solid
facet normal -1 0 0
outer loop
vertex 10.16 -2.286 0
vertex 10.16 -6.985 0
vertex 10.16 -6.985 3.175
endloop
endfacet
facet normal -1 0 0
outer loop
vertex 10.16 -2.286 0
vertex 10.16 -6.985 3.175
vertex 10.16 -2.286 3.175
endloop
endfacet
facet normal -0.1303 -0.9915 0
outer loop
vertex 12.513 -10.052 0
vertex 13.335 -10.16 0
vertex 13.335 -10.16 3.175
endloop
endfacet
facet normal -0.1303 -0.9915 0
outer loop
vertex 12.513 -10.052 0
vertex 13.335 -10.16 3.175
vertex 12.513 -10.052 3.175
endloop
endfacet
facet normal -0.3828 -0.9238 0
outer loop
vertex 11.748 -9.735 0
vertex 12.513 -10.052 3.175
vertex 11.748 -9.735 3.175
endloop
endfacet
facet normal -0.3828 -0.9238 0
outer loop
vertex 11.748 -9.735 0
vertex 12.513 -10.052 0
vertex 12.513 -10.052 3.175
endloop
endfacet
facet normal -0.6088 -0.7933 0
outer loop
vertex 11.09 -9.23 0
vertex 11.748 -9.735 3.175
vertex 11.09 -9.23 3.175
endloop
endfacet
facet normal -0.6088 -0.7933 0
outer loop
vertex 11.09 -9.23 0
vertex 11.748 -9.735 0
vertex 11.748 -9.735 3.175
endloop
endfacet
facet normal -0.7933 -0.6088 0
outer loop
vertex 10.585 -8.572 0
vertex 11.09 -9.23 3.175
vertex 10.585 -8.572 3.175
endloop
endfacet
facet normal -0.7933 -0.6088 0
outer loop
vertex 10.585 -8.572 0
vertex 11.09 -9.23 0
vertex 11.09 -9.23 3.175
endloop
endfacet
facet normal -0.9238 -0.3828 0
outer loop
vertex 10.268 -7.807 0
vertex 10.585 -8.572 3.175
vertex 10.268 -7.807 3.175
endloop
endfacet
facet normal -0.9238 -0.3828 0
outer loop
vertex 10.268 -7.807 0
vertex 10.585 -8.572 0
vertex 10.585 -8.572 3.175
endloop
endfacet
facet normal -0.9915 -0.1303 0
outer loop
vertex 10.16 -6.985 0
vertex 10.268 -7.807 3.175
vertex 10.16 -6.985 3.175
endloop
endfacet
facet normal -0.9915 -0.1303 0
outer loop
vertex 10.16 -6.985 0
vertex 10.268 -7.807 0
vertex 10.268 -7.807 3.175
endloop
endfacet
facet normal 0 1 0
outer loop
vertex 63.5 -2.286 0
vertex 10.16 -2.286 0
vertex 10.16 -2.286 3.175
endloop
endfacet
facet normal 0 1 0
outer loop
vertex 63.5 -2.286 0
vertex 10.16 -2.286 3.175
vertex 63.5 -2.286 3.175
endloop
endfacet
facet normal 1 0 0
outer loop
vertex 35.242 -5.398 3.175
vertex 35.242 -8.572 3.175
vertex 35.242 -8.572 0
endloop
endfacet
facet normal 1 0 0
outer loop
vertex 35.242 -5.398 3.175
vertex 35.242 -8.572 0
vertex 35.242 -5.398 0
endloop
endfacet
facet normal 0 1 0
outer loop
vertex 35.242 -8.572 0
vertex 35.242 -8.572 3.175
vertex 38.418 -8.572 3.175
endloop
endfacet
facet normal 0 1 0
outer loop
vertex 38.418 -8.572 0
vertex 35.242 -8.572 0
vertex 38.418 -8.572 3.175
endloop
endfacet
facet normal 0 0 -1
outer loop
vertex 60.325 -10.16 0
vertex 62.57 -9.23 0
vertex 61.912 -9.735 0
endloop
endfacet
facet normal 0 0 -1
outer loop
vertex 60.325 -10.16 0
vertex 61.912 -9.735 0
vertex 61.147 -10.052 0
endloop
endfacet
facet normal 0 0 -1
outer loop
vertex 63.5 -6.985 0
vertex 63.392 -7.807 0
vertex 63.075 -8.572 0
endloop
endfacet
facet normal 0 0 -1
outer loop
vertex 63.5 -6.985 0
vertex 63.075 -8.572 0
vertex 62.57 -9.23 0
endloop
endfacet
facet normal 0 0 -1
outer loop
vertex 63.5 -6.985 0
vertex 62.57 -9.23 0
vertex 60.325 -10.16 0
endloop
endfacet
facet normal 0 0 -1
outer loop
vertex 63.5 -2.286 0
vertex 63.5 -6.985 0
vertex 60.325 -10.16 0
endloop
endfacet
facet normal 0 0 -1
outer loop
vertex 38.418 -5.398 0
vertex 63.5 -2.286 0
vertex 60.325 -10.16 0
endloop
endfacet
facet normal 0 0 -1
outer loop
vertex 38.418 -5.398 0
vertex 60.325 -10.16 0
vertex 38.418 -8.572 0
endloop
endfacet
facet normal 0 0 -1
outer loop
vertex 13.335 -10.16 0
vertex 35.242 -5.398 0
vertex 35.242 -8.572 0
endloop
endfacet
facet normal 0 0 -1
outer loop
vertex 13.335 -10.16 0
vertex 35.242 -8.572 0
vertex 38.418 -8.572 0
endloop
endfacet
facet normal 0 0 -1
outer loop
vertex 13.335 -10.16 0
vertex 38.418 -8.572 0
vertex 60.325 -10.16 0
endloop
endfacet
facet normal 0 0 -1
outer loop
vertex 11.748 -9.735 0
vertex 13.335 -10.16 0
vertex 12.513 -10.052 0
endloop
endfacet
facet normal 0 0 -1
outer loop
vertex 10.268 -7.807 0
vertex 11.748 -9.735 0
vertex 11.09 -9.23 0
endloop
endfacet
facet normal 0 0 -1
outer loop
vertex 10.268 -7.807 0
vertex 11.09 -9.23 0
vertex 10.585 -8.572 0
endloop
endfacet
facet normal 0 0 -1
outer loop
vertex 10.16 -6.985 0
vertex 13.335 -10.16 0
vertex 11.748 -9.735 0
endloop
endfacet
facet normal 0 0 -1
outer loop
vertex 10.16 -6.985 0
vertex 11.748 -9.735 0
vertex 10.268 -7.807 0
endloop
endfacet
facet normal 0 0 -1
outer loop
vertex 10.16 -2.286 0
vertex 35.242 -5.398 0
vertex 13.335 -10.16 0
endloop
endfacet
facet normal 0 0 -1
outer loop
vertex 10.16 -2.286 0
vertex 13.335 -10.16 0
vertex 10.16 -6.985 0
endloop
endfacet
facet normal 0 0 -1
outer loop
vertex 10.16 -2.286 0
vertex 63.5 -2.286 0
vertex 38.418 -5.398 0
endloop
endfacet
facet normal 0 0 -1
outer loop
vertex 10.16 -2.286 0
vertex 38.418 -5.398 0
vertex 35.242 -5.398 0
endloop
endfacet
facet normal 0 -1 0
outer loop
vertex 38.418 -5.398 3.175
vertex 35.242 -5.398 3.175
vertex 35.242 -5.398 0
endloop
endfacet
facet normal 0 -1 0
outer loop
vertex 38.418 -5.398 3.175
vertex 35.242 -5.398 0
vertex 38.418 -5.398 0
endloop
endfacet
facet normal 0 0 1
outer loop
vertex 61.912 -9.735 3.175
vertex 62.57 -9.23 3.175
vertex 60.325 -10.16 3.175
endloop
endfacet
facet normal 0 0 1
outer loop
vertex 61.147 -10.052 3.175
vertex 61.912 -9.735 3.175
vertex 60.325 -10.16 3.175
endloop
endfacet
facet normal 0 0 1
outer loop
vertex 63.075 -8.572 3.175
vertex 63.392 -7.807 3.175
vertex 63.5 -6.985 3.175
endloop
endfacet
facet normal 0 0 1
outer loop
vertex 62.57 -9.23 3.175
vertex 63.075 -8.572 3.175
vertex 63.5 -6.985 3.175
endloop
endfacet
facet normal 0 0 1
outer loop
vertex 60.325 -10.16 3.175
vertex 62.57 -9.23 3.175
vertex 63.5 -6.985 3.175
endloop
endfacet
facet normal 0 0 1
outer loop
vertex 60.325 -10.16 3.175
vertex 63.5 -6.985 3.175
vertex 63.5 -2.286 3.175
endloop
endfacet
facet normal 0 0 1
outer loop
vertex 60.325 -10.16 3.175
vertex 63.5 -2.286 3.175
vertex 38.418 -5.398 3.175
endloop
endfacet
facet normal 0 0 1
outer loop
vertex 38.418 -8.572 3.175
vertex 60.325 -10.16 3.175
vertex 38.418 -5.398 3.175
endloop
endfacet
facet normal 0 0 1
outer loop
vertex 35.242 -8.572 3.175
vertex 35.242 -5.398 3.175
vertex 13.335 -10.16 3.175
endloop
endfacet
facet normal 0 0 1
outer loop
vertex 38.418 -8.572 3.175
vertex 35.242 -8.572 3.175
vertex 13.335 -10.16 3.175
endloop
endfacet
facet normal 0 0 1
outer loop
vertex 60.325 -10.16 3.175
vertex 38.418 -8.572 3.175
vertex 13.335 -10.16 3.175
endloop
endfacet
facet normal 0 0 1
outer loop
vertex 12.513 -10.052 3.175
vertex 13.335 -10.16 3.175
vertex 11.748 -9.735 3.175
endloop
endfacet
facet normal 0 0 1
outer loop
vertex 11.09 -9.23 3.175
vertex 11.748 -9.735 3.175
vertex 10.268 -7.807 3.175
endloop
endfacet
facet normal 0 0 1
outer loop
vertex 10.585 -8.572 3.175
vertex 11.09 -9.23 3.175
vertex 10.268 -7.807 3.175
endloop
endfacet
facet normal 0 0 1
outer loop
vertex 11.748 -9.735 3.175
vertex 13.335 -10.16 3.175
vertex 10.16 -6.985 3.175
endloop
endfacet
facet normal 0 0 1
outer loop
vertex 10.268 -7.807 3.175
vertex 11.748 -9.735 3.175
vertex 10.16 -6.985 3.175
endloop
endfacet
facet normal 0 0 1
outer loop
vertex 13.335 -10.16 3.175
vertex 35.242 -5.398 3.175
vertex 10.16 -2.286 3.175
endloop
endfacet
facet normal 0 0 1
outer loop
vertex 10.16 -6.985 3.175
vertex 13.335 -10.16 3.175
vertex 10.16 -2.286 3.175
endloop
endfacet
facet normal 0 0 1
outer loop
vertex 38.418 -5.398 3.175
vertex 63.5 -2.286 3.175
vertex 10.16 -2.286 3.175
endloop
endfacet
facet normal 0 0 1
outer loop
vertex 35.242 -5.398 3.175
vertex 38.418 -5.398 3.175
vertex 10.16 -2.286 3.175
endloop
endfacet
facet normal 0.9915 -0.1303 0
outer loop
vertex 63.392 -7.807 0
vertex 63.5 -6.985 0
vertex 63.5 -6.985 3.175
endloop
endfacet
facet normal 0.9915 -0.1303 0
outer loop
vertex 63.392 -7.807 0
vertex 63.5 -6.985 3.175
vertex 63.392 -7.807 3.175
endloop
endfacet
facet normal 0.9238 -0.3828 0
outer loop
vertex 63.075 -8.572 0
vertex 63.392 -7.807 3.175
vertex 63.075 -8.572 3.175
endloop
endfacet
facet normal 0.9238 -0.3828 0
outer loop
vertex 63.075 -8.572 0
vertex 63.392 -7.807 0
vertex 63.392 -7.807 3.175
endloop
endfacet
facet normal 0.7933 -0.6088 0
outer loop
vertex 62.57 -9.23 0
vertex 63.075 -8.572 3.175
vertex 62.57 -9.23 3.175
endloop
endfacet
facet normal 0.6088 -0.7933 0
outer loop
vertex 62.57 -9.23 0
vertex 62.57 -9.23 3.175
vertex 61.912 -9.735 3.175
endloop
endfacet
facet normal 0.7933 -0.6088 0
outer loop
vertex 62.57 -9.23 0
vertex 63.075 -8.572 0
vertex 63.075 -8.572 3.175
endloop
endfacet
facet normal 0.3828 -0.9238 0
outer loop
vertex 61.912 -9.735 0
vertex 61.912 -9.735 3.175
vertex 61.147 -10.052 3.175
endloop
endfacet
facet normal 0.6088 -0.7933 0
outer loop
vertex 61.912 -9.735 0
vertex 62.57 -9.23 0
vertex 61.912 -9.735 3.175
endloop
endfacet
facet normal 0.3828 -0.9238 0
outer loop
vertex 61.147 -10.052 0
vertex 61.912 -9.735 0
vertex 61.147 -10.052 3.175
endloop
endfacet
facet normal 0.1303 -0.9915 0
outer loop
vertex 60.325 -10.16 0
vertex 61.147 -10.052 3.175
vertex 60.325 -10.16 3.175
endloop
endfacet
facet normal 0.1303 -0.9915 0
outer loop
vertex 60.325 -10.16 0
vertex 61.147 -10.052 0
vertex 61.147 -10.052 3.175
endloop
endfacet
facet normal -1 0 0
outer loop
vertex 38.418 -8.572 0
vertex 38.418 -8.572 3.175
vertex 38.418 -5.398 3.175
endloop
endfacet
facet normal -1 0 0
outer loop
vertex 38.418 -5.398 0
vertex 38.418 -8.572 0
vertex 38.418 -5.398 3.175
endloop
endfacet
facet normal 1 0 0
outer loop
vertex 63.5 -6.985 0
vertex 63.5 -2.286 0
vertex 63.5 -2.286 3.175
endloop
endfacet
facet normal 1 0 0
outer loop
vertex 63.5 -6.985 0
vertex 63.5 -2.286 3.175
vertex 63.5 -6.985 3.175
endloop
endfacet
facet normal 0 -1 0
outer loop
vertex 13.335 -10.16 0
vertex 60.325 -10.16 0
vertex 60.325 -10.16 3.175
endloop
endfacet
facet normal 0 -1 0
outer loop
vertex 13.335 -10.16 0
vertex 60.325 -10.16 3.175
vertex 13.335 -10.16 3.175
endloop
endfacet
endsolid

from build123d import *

# Parameters (mm, degrees)
SKETCH1_W           = 3.175
SKETCH1_H           = 3.175
BOSS_EXTRUDE1_DEPTH = 3.175


with BuildPart() as part:
    # Sketch1 → Boss-Extrude1 (new body)
    with BuildSketch(Plane.XY):
        with BuildLine():
            Line((10.16, -2.286), (63.5, -2.286))
            Line((63.5, -2.286), (63.5, -6.985))
            ThreePointArc((63.5, -6.985), (62.57006403, -9.23006403), (60.325, -10.16))
            Line((60.325, -10.16), (13.335, -10.16))
            ThreePointArc((13.335, -10.16), (11.08993597, -9.23006403), (10.16, -6.985))
            Line((10.16, -6.985), (10.16, -2.286))
        make_face()
        with Locations((36.83, -6.985)):
            Rectangle(SKETCH1_W, SKETCH1_H, mode=Mode.SUBTRACT)
    extrude(amount=BOSS_EXTRUDE1_DEPTH)


solid = part.part
